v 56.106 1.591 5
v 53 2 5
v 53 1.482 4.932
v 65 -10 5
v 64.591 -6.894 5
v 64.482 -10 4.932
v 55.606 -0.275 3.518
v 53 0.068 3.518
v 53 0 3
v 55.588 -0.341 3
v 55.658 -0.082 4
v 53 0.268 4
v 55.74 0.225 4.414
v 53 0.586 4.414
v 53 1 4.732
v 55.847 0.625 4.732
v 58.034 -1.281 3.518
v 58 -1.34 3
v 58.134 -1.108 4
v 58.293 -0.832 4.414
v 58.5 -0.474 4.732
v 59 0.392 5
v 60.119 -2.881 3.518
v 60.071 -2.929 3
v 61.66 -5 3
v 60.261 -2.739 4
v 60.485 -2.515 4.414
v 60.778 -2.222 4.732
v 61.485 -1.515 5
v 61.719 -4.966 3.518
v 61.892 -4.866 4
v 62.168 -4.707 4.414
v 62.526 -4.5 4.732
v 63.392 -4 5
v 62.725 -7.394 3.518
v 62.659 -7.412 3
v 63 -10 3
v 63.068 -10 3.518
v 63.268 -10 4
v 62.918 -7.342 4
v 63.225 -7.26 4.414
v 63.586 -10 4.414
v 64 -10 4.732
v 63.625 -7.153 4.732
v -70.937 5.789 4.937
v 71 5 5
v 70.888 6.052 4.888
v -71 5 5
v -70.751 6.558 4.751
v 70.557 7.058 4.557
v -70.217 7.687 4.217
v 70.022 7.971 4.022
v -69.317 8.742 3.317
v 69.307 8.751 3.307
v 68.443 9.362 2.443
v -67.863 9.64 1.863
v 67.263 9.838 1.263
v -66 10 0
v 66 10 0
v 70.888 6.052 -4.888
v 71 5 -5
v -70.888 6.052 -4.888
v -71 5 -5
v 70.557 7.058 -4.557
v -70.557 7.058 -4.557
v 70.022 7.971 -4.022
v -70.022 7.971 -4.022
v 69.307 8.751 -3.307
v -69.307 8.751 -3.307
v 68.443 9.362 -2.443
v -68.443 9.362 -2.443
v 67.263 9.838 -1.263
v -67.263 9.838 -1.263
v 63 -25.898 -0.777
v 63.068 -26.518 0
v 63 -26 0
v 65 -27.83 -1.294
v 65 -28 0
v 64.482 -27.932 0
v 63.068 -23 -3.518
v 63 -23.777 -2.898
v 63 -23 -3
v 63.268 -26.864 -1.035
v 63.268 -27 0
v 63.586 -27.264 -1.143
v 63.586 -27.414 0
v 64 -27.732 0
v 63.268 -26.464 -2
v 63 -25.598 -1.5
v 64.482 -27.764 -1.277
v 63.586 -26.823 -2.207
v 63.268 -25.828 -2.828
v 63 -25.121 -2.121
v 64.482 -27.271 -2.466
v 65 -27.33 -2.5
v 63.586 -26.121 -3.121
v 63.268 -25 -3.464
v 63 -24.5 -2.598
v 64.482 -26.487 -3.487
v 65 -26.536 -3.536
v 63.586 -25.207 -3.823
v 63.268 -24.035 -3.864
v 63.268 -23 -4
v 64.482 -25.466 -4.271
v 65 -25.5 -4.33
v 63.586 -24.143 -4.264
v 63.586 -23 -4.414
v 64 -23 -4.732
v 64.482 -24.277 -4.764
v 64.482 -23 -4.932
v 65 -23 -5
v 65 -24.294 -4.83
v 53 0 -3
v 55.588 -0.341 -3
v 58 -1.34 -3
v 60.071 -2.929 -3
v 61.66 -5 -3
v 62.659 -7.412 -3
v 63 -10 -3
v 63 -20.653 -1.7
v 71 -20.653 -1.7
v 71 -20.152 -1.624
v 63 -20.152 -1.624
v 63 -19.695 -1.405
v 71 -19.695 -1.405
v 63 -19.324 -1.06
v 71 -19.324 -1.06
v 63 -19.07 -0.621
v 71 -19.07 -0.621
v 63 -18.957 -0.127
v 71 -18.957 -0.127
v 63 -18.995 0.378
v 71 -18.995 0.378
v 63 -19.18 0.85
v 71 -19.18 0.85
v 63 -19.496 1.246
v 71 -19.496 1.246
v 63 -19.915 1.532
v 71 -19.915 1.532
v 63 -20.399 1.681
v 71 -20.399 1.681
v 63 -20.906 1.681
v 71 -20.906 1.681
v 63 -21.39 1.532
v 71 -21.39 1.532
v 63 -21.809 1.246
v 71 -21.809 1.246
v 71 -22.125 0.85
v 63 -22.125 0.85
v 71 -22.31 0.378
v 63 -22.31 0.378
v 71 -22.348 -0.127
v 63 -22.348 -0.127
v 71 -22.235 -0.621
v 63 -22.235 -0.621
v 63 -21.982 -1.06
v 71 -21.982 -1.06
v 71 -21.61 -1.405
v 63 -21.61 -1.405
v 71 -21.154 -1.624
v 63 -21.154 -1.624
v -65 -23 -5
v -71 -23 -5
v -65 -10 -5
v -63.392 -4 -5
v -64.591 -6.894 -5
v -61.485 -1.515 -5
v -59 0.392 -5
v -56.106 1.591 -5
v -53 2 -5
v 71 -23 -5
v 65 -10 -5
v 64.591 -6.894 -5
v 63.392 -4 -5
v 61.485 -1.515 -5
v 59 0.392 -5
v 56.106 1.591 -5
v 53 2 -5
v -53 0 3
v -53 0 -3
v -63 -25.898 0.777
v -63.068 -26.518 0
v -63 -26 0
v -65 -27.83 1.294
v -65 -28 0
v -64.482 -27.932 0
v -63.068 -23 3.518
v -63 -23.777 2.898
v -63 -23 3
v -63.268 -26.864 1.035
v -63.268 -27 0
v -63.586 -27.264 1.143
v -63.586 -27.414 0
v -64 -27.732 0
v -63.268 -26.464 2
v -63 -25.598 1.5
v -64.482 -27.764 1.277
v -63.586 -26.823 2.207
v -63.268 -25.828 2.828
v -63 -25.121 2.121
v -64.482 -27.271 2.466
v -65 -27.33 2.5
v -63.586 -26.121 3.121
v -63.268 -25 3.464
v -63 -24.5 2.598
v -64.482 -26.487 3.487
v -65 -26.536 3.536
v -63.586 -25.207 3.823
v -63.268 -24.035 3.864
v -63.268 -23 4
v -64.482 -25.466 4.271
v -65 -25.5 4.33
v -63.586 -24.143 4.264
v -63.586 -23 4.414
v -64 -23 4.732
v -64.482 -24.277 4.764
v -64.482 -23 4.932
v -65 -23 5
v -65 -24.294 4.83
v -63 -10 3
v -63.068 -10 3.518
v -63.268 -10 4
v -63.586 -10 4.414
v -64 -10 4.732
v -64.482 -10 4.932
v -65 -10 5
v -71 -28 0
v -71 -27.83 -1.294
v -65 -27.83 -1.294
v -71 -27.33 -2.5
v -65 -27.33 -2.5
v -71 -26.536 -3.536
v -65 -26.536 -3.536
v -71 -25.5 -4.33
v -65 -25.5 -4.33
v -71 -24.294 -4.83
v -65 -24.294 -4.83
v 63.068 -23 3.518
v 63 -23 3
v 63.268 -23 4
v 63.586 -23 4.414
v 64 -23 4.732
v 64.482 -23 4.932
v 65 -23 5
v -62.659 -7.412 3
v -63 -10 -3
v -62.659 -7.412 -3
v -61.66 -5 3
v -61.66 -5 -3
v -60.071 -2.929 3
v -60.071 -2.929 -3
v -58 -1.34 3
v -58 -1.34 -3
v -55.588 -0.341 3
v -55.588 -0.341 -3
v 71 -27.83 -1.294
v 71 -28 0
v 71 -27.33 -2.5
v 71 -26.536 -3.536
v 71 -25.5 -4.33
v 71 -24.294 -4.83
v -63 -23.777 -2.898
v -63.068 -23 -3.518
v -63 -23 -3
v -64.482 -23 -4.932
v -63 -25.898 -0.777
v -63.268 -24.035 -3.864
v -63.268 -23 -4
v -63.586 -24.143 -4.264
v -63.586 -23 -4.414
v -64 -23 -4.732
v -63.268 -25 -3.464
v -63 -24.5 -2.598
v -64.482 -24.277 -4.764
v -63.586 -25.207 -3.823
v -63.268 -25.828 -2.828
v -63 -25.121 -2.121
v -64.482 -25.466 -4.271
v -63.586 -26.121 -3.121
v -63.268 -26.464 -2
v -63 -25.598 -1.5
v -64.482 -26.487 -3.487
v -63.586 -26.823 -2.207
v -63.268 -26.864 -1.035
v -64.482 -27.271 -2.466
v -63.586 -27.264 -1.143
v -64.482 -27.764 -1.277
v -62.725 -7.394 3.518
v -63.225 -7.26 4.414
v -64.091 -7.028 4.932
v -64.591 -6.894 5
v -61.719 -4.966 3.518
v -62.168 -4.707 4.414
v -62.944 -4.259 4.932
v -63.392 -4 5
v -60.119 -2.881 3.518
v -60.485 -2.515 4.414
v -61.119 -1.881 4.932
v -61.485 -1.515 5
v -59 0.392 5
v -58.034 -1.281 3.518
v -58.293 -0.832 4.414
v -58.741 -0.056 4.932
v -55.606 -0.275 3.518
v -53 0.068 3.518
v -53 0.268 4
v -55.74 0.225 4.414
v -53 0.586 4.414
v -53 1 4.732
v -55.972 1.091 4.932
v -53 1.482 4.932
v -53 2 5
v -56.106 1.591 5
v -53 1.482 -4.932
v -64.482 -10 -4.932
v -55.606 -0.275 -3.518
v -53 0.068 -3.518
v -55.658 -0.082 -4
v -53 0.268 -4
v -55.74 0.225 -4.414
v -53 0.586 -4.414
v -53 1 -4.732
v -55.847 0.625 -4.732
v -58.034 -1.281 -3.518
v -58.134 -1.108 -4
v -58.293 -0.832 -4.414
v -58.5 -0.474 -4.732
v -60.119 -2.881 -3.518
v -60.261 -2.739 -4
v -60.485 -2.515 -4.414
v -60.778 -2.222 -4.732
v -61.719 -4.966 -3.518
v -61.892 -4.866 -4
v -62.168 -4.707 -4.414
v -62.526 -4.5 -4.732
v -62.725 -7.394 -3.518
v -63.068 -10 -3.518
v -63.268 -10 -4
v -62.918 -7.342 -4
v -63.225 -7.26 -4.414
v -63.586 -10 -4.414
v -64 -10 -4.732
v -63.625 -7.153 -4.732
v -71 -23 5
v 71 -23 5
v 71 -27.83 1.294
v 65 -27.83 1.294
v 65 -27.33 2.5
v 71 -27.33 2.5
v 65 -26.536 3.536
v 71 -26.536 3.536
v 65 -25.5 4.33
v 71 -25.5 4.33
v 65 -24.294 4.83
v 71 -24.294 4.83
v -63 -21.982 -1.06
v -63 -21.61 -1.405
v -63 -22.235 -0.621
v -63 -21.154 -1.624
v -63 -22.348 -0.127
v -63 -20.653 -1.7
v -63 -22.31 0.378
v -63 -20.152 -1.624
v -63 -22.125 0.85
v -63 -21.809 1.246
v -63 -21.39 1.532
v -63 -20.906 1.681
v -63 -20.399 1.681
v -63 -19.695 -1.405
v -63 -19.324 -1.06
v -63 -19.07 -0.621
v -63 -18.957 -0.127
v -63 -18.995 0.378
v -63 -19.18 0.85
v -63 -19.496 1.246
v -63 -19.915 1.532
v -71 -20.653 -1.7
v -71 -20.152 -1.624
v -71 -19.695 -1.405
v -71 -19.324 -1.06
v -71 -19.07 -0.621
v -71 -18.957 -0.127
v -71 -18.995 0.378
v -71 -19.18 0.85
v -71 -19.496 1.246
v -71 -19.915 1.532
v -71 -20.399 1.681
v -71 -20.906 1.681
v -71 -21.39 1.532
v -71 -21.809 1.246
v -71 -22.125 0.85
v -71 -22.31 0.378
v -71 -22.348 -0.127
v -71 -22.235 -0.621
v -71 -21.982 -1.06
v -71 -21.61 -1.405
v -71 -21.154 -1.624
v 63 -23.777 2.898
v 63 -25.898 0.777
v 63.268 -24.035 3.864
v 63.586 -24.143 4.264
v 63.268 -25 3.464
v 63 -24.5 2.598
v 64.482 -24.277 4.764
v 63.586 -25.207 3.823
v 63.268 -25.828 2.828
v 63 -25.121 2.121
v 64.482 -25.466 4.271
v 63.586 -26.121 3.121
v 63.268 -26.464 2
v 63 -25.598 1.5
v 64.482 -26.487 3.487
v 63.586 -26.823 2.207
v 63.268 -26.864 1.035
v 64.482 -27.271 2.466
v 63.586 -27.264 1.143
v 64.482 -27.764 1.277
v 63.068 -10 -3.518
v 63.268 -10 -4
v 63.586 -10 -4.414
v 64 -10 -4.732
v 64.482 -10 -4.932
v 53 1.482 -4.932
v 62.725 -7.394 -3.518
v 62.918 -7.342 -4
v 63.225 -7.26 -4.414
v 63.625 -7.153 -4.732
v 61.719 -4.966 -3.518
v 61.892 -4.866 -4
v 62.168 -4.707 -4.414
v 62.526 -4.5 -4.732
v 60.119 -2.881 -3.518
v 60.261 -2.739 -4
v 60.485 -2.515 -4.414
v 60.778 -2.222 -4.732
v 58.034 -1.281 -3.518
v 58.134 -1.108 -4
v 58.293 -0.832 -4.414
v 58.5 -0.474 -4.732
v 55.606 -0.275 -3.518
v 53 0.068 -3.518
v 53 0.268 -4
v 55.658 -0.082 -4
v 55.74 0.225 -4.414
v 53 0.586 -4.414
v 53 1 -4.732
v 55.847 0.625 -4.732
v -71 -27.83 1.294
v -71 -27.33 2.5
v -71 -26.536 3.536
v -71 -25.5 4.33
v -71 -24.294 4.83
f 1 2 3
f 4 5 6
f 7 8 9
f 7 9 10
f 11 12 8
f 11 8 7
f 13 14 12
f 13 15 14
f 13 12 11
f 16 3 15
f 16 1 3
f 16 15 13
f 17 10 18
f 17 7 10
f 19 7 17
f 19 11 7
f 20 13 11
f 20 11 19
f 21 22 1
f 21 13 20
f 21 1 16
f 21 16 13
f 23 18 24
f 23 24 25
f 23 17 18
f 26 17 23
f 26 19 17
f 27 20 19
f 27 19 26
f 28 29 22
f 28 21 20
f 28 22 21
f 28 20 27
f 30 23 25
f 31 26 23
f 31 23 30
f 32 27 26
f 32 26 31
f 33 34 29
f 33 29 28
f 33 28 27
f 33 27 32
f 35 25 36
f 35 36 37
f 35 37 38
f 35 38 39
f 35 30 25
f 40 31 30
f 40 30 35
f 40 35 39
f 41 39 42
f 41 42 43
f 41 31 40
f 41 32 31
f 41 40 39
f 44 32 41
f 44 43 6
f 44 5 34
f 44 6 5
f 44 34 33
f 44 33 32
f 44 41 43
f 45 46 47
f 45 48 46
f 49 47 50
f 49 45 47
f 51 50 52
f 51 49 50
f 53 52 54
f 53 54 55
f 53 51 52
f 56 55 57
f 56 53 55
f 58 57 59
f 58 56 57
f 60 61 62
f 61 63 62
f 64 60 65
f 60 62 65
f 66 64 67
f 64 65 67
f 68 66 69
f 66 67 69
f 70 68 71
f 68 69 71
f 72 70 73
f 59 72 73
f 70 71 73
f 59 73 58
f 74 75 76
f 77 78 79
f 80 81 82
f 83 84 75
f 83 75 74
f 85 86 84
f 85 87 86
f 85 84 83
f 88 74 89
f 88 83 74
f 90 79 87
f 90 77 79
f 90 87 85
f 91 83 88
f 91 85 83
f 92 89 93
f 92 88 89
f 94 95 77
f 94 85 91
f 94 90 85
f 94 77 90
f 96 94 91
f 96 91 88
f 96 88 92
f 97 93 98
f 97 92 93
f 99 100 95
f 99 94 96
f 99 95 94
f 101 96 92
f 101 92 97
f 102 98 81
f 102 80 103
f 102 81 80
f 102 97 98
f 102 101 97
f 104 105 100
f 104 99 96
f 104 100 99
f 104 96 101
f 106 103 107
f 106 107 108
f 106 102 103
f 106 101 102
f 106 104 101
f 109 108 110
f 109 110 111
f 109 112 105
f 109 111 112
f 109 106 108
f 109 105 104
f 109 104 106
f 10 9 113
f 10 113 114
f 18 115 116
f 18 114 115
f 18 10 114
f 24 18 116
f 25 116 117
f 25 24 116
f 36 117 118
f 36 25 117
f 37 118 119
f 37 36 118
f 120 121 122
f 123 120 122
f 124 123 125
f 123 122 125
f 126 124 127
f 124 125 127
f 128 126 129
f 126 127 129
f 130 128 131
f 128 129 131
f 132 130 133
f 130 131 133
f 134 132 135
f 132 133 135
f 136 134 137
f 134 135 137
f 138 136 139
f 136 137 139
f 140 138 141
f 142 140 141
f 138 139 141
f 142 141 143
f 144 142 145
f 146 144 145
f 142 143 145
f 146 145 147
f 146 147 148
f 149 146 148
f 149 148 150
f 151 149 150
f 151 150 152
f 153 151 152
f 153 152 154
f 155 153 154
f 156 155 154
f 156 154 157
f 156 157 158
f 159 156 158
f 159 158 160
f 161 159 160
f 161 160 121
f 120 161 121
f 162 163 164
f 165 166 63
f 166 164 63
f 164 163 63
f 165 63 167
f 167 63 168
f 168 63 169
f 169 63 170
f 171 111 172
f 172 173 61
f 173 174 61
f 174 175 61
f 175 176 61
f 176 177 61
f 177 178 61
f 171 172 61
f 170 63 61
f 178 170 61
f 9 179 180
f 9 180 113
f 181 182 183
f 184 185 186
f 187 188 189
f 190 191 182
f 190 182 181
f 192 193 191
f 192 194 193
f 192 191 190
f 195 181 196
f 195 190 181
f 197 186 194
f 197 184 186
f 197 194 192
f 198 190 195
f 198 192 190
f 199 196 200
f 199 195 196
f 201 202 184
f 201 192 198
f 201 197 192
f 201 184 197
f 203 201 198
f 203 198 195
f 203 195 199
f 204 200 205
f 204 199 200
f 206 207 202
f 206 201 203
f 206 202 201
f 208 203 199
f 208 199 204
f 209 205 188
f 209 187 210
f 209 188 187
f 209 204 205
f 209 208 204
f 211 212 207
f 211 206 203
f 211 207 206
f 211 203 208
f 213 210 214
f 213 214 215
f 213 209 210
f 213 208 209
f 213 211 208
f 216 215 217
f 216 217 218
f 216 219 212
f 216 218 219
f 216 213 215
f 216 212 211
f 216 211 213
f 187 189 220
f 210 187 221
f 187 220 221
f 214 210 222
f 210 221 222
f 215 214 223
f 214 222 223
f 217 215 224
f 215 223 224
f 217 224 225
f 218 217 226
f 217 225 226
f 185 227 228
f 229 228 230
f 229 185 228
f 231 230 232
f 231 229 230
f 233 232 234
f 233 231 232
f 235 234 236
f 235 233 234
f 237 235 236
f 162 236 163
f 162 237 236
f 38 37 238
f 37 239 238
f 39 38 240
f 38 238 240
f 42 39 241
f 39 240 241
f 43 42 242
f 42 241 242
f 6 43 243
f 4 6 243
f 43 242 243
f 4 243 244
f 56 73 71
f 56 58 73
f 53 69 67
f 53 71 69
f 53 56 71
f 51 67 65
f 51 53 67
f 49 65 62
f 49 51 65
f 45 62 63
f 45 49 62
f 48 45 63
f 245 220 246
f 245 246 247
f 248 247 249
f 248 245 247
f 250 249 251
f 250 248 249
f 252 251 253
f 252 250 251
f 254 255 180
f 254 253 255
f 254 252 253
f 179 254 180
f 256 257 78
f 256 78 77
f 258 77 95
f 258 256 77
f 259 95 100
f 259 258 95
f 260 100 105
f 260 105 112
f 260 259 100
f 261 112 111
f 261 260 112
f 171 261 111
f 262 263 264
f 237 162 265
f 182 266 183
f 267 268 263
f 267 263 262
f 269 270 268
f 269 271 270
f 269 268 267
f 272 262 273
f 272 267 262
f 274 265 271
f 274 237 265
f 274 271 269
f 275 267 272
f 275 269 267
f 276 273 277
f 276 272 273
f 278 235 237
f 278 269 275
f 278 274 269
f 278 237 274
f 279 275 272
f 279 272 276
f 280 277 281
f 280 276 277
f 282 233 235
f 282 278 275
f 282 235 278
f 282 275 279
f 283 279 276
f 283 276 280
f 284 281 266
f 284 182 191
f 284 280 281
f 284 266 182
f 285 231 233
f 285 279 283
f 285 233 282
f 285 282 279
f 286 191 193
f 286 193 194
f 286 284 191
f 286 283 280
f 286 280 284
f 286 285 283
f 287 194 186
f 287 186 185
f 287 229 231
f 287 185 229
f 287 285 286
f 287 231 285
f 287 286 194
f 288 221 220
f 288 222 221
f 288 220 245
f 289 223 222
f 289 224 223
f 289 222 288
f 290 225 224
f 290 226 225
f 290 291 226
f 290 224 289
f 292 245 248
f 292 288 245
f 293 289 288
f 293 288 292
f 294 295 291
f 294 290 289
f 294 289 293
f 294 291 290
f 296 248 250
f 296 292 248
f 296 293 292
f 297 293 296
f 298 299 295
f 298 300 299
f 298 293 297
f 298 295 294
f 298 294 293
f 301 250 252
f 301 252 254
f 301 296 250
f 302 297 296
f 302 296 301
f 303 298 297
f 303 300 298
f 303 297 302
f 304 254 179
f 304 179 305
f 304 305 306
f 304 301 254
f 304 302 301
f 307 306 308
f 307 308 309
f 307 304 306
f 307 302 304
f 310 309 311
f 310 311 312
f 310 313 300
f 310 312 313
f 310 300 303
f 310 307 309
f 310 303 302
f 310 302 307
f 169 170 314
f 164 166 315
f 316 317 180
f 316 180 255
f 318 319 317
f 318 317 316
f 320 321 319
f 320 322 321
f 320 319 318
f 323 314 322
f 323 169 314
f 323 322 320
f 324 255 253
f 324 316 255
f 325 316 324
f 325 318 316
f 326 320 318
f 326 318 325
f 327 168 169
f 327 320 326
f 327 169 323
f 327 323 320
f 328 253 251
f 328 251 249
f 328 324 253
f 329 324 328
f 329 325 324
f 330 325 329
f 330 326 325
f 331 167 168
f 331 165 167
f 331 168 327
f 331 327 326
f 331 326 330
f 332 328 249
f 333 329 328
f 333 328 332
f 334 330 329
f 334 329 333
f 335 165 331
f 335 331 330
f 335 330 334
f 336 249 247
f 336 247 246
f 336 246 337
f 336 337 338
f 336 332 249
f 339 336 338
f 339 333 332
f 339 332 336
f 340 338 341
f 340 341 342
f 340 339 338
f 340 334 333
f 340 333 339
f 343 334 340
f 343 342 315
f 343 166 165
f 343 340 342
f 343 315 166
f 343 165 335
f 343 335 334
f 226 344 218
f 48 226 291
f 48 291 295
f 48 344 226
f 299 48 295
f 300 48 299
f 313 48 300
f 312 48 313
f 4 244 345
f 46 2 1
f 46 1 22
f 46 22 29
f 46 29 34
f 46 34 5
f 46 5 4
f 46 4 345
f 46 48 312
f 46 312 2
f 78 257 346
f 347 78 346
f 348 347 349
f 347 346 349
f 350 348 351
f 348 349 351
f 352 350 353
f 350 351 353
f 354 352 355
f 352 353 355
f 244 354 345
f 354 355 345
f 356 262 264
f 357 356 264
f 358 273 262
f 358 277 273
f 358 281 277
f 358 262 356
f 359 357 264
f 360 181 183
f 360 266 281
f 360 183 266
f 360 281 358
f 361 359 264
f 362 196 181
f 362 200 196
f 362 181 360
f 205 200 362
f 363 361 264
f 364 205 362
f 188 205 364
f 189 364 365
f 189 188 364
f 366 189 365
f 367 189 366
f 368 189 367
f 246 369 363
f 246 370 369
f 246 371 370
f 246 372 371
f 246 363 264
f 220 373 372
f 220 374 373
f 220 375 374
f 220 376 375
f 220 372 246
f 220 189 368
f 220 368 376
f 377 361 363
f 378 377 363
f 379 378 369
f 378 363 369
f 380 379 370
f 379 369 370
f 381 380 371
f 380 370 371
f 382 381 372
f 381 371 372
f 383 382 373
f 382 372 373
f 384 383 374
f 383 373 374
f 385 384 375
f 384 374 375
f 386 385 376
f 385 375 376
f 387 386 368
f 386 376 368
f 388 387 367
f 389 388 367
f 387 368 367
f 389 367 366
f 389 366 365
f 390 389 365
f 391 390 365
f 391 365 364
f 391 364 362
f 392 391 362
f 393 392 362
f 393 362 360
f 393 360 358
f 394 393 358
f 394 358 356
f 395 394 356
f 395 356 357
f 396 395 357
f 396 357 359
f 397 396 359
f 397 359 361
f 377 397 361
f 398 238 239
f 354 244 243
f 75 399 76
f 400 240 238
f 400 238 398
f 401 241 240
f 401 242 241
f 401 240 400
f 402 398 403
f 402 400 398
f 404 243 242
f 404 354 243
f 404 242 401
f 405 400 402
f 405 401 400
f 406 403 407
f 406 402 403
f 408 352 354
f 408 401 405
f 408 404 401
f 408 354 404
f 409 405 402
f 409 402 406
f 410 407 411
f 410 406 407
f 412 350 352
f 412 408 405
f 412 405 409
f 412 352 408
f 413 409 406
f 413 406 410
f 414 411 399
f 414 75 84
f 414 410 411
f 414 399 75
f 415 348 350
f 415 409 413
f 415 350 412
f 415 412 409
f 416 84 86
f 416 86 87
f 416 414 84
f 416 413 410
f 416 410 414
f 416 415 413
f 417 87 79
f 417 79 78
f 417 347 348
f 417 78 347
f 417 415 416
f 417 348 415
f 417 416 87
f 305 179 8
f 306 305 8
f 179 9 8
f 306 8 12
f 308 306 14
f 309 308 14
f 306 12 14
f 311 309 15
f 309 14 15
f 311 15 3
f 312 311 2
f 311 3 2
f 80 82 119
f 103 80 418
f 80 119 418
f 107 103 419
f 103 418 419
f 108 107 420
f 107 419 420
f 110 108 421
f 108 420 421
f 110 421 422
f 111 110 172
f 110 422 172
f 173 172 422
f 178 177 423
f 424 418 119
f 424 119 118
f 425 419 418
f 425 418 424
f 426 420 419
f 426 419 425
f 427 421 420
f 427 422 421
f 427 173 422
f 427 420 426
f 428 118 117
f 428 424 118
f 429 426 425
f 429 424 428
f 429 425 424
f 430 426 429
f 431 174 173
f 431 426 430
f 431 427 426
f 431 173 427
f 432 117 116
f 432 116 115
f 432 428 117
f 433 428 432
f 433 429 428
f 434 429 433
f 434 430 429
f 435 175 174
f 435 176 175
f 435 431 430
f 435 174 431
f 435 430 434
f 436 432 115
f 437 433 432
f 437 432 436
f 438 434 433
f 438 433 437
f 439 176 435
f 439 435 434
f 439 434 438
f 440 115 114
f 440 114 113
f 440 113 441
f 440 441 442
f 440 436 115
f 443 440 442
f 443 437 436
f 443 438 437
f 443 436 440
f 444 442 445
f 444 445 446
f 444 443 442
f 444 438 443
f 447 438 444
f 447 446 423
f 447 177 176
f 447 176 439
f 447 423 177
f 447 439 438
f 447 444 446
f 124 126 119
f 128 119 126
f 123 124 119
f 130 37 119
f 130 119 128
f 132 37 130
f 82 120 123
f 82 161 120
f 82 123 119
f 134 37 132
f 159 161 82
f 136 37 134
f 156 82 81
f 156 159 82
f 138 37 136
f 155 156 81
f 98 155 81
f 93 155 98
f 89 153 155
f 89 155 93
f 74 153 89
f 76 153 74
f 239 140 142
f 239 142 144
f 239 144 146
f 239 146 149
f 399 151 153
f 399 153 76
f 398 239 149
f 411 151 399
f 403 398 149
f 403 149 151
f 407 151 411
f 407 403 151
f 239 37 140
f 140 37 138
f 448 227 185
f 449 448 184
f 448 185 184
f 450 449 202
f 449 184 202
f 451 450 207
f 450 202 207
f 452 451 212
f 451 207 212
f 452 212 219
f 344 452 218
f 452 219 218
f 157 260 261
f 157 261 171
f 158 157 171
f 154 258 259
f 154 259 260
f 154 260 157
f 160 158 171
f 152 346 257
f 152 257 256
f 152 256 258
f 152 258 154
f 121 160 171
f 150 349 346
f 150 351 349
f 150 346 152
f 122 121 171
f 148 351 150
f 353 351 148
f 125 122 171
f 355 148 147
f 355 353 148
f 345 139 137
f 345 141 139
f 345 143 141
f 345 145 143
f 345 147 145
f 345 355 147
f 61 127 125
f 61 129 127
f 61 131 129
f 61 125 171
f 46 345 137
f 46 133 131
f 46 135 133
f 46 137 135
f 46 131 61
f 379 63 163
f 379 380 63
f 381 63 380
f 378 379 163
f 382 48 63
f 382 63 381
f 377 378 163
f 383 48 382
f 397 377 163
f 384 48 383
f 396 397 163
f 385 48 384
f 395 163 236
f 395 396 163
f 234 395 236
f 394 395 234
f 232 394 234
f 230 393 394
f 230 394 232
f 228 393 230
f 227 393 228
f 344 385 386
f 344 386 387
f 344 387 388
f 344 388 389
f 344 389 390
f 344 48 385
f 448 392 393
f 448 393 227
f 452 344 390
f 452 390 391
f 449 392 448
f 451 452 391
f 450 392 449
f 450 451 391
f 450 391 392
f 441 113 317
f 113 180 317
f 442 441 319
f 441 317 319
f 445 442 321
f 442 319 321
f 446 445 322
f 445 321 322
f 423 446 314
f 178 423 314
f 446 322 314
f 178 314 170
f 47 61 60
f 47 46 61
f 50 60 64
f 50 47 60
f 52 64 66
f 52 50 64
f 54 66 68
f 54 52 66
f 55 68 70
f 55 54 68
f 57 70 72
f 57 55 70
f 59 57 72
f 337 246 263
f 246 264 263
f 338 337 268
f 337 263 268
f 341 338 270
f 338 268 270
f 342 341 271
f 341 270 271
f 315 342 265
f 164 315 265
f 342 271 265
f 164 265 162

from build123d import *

# Parameters (mm, degrees)
BOSS_EXTRUDE1_DEPTH = 5
FILLET1_R           = 5
FILLET2_R           = 5
FILLET3_R           = 2
SKETCH2_R           = 1.7
CUT_EXTRUDE1_DEPTH  = 147


with BuildPart() as part:
    # Sketch1 → Boss-Extrude1 (new, symmetric)
    with BuildSketch(Plane.XY):
        with BuildLine():
            ThreePointArc((-63, -10), (-60.071067812, -2.928932188), (-53, 0))
            Line((-53, 0), (0, 0))
            Line((0, 0), (0, 10))
            Line((0, 10), (-71, 10))
            Line((-71, 10), (-71, 0))
            Line((-71, 0), (-71, -28))
            Line((-71, -28), (-63, -28))
            Line((-63, -28), (-63, -10))
        make_face()
        with BuildLine():
            Line((0, 10), (0, 0))
            Line((0, 0), (53, 0))
            ThreePointArc((53, 0), (60.071067812, -2.928932188), (63, -10))
            Line((63, -10), (63, -28))
            Line((63, -28), (71, -28))
            Line((71, -28), (71, 0))
            Line((71, 0), (71, 10))
            Line((71, 10), (0, 10))
        make_face()
    extrude(amount=BOSS_EXTRUDE1_DEPTH, both=True)

    # Fillet1
    fillet1_edges = [part.edges().sort_by_distance(p)[0] for p in [
        (-67, -28, -5),
        (-67, -28, 5),
        (67, -28, -5),
        (67, -28, 5),
    ]]
    fillet(fillet1_edges, radius=FILLET1_R - 0.0001)  # a hair under: the kernel refuses the full size

    # Fillet2
    fillet2_edges = [part.edges().sort_by_distance(p)[0] for p in [
        (0, 10, -5),
        (-71, 10, 0),
        (71, 10, 0),
        (0, 10, 5),
    ]]
    fillet(fillet2_edges, radius=FILLET2_R - 0.0001)  # a hair under: the kernel refuses the full size

    # Fillet3
    fillet3_edges = [part.edges().sort_by_distance(p)[0] for p in [
        (0, 0, 5),
        (-63, -16.50005, -5),
        (63, -16.50005, -5),
        (60.071067812, -2.928932188, -5),
        (60.071067812, -2.928932188, 5),
        (0, 0, -5),
        (-60.071067812, -2.928932188, -5),
        (63, -16.50005, 5),
        (-63, -26.535563195, 3.535563195),
        (-63, -26.535563195, -3.535563195),
        (63, -26.535563195, 3.535563195),
        (63, -26.535563195, -3.535563195),
        (-60.071067812, -2.928932188, 5),
        (-63, -16.50005, 5),
    ]]
    fillet(fillet3_edges, radius=FILLET3_R)

    # Sketch2 → Cut-Extrude1 (cut)
    with BuildSketch(Plane(origin=(71, 0, 0), x_dir=(0, 0, -1), z_dir=(1, 0, 0))):
        with Locations((0, -20.652619003)):
            Circle(SKETCH2_R)
    extrude(amount=-CUT_EXTRUDE1_DEPTH, mode=Mode.SUBTRACT)


solid = part.part
